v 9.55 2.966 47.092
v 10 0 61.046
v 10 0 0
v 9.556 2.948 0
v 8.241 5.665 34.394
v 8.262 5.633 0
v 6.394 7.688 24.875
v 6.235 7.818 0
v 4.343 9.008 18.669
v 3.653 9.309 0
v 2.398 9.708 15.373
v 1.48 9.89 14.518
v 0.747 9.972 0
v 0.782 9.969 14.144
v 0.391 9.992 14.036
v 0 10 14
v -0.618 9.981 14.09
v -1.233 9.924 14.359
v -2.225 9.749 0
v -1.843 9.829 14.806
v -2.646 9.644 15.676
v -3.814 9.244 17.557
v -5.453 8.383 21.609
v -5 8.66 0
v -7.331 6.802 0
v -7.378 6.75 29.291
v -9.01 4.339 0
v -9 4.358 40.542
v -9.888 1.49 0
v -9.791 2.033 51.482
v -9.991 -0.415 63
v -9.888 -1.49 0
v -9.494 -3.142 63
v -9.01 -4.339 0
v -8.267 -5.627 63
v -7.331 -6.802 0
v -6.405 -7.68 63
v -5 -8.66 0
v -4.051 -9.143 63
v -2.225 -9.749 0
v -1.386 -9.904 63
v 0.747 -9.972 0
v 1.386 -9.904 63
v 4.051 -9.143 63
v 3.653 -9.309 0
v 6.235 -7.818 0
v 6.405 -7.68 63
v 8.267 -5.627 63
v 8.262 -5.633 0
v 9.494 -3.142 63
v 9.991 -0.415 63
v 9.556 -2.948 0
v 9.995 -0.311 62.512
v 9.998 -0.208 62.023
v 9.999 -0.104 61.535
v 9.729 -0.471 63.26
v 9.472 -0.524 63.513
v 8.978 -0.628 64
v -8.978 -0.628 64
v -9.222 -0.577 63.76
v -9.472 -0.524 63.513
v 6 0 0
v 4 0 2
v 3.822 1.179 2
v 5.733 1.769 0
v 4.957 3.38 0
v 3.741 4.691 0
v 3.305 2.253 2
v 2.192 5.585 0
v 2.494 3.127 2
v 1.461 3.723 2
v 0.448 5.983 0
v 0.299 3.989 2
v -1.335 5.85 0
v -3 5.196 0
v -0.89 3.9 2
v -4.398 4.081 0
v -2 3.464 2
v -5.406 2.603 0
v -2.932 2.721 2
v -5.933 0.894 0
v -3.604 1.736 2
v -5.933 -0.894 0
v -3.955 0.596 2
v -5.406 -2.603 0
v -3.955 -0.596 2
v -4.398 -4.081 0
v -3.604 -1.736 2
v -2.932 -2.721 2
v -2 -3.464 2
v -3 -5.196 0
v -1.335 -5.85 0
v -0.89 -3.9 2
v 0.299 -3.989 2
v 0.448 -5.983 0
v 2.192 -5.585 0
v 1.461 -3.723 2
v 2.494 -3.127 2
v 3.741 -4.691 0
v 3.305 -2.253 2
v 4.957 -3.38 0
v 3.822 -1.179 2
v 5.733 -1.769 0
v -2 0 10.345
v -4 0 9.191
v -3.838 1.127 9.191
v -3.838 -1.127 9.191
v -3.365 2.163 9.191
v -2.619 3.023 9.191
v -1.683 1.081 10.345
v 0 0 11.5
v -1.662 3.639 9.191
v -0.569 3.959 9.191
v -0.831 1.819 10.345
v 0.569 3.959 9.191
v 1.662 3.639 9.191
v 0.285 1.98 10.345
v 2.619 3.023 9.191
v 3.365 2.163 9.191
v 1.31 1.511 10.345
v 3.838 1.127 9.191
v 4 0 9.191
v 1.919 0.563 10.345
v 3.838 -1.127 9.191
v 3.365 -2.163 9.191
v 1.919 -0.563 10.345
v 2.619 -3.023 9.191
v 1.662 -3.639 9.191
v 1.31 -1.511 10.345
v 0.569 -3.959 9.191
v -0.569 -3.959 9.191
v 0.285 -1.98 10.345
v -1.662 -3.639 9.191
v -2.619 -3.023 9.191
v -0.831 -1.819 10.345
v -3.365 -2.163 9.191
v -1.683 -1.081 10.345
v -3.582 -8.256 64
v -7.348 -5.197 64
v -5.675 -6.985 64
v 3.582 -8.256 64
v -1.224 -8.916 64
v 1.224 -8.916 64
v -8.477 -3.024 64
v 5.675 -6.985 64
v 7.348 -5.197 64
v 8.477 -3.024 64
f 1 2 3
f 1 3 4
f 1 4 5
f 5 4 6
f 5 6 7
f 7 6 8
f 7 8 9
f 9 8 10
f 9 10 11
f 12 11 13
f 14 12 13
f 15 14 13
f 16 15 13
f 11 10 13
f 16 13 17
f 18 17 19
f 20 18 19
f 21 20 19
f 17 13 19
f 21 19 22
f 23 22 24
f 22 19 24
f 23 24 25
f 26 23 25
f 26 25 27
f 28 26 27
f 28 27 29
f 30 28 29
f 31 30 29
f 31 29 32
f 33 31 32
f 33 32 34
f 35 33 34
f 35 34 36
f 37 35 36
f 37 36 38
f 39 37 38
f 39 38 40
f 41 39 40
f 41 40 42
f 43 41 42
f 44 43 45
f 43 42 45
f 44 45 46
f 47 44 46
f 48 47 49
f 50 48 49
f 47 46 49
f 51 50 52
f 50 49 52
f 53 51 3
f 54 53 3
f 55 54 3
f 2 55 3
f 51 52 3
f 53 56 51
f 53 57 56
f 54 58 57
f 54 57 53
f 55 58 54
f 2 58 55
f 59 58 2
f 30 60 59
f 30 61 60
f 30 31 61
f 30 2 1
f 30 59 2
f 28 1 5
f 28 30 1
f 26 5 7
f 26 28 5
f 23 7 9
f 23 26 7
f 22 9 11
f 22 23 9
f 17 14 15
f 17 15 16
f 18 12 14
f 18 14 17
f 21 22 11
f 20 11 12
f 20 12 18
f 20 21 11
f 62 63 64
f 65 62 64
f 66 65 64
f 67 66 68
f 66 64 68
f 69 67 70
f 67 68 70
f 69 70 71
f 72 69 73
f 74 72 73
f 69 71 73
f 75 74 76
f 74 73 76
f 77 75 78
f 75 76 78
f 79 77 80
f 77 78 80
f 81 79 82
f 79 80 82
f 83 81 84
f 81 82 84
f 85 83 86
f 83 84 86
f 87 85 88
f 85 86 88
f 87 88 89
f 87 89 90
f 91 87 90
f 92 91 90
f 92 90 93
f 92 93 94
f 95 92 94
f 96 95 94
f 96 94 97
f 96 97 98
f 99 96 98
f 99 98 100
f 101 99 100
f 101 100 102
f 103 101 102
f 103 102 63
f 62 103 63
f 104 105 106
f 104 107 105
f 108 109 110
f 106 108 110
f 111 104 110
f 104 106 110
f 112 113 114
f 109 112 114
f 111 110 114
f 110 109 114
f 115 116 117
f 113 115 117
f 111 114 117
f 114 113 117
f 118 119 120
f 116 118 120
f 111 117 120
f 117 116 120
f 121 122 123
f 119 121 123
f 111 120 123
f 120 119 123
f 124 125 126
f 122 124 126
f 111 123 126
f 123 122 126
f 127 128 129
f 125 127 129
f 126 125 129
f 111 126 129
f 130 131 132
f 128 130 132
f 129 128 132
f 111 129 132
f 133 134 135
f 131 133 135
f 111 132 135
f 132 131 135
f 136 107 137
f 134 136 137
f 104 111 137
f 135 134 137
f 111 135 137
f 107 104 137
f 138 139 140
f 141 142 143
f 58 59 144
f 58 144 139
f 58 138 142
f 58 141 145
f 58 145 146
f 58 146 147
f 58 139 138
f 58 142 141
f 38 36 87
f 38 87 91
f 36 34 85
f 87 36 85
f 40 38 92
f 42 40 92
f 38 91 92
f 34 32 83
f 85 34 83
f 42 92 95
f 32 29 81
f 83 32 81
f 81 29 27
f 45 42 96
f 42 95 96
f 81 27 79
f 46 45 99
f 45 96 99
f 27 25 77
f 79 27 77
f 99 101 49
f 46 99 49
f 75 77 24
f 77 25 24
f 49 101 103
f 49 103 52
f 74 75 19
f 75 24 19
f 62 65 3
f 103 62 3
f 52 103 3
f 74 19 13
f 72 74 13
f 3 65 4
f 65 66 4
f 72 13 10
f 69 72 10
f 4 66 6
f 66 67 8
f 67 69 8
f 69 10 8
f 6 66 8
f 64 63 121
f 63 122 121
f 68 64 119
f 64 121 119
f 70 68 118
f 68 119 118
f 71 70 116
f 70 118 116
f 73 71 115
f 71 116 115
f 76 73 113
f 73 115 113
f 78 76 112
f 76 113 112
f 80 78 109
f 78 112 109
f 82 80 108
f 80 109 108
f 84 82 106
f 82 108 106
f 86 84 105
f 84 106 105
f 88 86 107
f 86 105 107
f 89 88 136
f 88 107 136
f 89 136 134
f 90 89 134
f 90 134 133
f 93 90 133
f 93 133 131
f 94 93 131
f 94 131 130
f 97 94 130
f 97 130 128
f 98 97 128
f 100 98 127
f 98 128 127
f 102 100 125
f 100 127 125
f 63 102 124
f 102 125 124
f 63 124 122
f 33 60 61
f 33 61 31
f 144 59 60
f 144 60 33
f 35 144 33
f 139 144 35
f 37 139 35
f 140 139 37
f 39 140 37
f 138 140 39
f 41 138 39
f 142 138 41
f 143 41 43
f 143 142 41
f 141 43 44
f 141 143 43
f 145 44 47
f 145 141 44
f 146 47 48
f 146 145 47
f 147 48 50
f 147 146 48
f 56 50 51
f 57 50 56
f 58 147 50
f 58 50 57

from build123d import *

# Parameters (mm, degrees)
SKETCH_1_R               = 10
EXTRUDE_1_DEPTH          = 64
CHAMFER_1_SIZE           = 1
CUT_EXTRUDE_1_DEPTH      = 66.543878433
CUT_EXTRUDE_1_DEPTH_BACK = 66.543878433
F_8_0MM_1_D              = 8
F_8_0MM_1_DEPTH          = 9.190598923
F_8_0MM_1_CSINK_D        = 12
F_8_0MM_1_CSINK_ANGLE    = 90
F_8_0MM_1_TIP            = 2.309401077


with BuildPart() as part:
    # 草图1 → 凸台-拉伸1 (new body)
    with BuildSketch(Plane.XY):
        Circle(SKETCH_1_R)
    extrude(amount=EXTRUDE_1_DEPTH)

    # 倒角1
    chamfer_1_edges = [part.edges().sort_by_distance(p)[0] for p in [
        (-10, 0, 64),
    ]]
    chamfer(chamfer_1_edges, length=CHAMFER_1_SIZE)

    # 草图2 → 切除-拉伸1 (cut, two sides: drawn at the far end of the back side and taken through both)
    with BuildSketch(Plane(origin=(0, 0, 0), x_dir=(0, 0, -1), z_dir=(1, 0, 0)).offset(-CUT_EXTRUDE_1_DEPTH_BACK)):
        Polygon((-200.698918074, -29.684080093), (-64, -0.627828084), (-14, 10), (122.698918074, 39.05625201), (64.586414054, 312.454088158), (-258.811422094, 243.713756055), align=None)
    extrude(amount=CUT_EXTRUDE_1_DEPTH + CUT_EXTRUDE_1_DEPTH_BACK, mode=Mode.SUBTRACT)

    # Ø8.0mm 暗销孔1
    with Locations(Plane(origin=(0, 0, 0), x_dir=(-1, 0, 0), z_dir=(0, 0, -1))):
        with Locations((0, 0)):
            CounterSinkHole(F_8_0MM_1_D / 2, F_8_0MM_1_CSINK_D / 2, depth=F_8_0MM_1_DEPTH, counter_sink_angle=F_8_0MM_1_CSINK_ANGLE)
            with Locations((0, 0, -(F_8_0MM_1_DEPTH + F_8_0MM_1_TIP / 2))):  # 120° drill point
                Cone(0, F_8_0MM_1_D / 2, F_8_0MM_1_TIP, mode=Mode.SUBTRACT)


solid = part.part
